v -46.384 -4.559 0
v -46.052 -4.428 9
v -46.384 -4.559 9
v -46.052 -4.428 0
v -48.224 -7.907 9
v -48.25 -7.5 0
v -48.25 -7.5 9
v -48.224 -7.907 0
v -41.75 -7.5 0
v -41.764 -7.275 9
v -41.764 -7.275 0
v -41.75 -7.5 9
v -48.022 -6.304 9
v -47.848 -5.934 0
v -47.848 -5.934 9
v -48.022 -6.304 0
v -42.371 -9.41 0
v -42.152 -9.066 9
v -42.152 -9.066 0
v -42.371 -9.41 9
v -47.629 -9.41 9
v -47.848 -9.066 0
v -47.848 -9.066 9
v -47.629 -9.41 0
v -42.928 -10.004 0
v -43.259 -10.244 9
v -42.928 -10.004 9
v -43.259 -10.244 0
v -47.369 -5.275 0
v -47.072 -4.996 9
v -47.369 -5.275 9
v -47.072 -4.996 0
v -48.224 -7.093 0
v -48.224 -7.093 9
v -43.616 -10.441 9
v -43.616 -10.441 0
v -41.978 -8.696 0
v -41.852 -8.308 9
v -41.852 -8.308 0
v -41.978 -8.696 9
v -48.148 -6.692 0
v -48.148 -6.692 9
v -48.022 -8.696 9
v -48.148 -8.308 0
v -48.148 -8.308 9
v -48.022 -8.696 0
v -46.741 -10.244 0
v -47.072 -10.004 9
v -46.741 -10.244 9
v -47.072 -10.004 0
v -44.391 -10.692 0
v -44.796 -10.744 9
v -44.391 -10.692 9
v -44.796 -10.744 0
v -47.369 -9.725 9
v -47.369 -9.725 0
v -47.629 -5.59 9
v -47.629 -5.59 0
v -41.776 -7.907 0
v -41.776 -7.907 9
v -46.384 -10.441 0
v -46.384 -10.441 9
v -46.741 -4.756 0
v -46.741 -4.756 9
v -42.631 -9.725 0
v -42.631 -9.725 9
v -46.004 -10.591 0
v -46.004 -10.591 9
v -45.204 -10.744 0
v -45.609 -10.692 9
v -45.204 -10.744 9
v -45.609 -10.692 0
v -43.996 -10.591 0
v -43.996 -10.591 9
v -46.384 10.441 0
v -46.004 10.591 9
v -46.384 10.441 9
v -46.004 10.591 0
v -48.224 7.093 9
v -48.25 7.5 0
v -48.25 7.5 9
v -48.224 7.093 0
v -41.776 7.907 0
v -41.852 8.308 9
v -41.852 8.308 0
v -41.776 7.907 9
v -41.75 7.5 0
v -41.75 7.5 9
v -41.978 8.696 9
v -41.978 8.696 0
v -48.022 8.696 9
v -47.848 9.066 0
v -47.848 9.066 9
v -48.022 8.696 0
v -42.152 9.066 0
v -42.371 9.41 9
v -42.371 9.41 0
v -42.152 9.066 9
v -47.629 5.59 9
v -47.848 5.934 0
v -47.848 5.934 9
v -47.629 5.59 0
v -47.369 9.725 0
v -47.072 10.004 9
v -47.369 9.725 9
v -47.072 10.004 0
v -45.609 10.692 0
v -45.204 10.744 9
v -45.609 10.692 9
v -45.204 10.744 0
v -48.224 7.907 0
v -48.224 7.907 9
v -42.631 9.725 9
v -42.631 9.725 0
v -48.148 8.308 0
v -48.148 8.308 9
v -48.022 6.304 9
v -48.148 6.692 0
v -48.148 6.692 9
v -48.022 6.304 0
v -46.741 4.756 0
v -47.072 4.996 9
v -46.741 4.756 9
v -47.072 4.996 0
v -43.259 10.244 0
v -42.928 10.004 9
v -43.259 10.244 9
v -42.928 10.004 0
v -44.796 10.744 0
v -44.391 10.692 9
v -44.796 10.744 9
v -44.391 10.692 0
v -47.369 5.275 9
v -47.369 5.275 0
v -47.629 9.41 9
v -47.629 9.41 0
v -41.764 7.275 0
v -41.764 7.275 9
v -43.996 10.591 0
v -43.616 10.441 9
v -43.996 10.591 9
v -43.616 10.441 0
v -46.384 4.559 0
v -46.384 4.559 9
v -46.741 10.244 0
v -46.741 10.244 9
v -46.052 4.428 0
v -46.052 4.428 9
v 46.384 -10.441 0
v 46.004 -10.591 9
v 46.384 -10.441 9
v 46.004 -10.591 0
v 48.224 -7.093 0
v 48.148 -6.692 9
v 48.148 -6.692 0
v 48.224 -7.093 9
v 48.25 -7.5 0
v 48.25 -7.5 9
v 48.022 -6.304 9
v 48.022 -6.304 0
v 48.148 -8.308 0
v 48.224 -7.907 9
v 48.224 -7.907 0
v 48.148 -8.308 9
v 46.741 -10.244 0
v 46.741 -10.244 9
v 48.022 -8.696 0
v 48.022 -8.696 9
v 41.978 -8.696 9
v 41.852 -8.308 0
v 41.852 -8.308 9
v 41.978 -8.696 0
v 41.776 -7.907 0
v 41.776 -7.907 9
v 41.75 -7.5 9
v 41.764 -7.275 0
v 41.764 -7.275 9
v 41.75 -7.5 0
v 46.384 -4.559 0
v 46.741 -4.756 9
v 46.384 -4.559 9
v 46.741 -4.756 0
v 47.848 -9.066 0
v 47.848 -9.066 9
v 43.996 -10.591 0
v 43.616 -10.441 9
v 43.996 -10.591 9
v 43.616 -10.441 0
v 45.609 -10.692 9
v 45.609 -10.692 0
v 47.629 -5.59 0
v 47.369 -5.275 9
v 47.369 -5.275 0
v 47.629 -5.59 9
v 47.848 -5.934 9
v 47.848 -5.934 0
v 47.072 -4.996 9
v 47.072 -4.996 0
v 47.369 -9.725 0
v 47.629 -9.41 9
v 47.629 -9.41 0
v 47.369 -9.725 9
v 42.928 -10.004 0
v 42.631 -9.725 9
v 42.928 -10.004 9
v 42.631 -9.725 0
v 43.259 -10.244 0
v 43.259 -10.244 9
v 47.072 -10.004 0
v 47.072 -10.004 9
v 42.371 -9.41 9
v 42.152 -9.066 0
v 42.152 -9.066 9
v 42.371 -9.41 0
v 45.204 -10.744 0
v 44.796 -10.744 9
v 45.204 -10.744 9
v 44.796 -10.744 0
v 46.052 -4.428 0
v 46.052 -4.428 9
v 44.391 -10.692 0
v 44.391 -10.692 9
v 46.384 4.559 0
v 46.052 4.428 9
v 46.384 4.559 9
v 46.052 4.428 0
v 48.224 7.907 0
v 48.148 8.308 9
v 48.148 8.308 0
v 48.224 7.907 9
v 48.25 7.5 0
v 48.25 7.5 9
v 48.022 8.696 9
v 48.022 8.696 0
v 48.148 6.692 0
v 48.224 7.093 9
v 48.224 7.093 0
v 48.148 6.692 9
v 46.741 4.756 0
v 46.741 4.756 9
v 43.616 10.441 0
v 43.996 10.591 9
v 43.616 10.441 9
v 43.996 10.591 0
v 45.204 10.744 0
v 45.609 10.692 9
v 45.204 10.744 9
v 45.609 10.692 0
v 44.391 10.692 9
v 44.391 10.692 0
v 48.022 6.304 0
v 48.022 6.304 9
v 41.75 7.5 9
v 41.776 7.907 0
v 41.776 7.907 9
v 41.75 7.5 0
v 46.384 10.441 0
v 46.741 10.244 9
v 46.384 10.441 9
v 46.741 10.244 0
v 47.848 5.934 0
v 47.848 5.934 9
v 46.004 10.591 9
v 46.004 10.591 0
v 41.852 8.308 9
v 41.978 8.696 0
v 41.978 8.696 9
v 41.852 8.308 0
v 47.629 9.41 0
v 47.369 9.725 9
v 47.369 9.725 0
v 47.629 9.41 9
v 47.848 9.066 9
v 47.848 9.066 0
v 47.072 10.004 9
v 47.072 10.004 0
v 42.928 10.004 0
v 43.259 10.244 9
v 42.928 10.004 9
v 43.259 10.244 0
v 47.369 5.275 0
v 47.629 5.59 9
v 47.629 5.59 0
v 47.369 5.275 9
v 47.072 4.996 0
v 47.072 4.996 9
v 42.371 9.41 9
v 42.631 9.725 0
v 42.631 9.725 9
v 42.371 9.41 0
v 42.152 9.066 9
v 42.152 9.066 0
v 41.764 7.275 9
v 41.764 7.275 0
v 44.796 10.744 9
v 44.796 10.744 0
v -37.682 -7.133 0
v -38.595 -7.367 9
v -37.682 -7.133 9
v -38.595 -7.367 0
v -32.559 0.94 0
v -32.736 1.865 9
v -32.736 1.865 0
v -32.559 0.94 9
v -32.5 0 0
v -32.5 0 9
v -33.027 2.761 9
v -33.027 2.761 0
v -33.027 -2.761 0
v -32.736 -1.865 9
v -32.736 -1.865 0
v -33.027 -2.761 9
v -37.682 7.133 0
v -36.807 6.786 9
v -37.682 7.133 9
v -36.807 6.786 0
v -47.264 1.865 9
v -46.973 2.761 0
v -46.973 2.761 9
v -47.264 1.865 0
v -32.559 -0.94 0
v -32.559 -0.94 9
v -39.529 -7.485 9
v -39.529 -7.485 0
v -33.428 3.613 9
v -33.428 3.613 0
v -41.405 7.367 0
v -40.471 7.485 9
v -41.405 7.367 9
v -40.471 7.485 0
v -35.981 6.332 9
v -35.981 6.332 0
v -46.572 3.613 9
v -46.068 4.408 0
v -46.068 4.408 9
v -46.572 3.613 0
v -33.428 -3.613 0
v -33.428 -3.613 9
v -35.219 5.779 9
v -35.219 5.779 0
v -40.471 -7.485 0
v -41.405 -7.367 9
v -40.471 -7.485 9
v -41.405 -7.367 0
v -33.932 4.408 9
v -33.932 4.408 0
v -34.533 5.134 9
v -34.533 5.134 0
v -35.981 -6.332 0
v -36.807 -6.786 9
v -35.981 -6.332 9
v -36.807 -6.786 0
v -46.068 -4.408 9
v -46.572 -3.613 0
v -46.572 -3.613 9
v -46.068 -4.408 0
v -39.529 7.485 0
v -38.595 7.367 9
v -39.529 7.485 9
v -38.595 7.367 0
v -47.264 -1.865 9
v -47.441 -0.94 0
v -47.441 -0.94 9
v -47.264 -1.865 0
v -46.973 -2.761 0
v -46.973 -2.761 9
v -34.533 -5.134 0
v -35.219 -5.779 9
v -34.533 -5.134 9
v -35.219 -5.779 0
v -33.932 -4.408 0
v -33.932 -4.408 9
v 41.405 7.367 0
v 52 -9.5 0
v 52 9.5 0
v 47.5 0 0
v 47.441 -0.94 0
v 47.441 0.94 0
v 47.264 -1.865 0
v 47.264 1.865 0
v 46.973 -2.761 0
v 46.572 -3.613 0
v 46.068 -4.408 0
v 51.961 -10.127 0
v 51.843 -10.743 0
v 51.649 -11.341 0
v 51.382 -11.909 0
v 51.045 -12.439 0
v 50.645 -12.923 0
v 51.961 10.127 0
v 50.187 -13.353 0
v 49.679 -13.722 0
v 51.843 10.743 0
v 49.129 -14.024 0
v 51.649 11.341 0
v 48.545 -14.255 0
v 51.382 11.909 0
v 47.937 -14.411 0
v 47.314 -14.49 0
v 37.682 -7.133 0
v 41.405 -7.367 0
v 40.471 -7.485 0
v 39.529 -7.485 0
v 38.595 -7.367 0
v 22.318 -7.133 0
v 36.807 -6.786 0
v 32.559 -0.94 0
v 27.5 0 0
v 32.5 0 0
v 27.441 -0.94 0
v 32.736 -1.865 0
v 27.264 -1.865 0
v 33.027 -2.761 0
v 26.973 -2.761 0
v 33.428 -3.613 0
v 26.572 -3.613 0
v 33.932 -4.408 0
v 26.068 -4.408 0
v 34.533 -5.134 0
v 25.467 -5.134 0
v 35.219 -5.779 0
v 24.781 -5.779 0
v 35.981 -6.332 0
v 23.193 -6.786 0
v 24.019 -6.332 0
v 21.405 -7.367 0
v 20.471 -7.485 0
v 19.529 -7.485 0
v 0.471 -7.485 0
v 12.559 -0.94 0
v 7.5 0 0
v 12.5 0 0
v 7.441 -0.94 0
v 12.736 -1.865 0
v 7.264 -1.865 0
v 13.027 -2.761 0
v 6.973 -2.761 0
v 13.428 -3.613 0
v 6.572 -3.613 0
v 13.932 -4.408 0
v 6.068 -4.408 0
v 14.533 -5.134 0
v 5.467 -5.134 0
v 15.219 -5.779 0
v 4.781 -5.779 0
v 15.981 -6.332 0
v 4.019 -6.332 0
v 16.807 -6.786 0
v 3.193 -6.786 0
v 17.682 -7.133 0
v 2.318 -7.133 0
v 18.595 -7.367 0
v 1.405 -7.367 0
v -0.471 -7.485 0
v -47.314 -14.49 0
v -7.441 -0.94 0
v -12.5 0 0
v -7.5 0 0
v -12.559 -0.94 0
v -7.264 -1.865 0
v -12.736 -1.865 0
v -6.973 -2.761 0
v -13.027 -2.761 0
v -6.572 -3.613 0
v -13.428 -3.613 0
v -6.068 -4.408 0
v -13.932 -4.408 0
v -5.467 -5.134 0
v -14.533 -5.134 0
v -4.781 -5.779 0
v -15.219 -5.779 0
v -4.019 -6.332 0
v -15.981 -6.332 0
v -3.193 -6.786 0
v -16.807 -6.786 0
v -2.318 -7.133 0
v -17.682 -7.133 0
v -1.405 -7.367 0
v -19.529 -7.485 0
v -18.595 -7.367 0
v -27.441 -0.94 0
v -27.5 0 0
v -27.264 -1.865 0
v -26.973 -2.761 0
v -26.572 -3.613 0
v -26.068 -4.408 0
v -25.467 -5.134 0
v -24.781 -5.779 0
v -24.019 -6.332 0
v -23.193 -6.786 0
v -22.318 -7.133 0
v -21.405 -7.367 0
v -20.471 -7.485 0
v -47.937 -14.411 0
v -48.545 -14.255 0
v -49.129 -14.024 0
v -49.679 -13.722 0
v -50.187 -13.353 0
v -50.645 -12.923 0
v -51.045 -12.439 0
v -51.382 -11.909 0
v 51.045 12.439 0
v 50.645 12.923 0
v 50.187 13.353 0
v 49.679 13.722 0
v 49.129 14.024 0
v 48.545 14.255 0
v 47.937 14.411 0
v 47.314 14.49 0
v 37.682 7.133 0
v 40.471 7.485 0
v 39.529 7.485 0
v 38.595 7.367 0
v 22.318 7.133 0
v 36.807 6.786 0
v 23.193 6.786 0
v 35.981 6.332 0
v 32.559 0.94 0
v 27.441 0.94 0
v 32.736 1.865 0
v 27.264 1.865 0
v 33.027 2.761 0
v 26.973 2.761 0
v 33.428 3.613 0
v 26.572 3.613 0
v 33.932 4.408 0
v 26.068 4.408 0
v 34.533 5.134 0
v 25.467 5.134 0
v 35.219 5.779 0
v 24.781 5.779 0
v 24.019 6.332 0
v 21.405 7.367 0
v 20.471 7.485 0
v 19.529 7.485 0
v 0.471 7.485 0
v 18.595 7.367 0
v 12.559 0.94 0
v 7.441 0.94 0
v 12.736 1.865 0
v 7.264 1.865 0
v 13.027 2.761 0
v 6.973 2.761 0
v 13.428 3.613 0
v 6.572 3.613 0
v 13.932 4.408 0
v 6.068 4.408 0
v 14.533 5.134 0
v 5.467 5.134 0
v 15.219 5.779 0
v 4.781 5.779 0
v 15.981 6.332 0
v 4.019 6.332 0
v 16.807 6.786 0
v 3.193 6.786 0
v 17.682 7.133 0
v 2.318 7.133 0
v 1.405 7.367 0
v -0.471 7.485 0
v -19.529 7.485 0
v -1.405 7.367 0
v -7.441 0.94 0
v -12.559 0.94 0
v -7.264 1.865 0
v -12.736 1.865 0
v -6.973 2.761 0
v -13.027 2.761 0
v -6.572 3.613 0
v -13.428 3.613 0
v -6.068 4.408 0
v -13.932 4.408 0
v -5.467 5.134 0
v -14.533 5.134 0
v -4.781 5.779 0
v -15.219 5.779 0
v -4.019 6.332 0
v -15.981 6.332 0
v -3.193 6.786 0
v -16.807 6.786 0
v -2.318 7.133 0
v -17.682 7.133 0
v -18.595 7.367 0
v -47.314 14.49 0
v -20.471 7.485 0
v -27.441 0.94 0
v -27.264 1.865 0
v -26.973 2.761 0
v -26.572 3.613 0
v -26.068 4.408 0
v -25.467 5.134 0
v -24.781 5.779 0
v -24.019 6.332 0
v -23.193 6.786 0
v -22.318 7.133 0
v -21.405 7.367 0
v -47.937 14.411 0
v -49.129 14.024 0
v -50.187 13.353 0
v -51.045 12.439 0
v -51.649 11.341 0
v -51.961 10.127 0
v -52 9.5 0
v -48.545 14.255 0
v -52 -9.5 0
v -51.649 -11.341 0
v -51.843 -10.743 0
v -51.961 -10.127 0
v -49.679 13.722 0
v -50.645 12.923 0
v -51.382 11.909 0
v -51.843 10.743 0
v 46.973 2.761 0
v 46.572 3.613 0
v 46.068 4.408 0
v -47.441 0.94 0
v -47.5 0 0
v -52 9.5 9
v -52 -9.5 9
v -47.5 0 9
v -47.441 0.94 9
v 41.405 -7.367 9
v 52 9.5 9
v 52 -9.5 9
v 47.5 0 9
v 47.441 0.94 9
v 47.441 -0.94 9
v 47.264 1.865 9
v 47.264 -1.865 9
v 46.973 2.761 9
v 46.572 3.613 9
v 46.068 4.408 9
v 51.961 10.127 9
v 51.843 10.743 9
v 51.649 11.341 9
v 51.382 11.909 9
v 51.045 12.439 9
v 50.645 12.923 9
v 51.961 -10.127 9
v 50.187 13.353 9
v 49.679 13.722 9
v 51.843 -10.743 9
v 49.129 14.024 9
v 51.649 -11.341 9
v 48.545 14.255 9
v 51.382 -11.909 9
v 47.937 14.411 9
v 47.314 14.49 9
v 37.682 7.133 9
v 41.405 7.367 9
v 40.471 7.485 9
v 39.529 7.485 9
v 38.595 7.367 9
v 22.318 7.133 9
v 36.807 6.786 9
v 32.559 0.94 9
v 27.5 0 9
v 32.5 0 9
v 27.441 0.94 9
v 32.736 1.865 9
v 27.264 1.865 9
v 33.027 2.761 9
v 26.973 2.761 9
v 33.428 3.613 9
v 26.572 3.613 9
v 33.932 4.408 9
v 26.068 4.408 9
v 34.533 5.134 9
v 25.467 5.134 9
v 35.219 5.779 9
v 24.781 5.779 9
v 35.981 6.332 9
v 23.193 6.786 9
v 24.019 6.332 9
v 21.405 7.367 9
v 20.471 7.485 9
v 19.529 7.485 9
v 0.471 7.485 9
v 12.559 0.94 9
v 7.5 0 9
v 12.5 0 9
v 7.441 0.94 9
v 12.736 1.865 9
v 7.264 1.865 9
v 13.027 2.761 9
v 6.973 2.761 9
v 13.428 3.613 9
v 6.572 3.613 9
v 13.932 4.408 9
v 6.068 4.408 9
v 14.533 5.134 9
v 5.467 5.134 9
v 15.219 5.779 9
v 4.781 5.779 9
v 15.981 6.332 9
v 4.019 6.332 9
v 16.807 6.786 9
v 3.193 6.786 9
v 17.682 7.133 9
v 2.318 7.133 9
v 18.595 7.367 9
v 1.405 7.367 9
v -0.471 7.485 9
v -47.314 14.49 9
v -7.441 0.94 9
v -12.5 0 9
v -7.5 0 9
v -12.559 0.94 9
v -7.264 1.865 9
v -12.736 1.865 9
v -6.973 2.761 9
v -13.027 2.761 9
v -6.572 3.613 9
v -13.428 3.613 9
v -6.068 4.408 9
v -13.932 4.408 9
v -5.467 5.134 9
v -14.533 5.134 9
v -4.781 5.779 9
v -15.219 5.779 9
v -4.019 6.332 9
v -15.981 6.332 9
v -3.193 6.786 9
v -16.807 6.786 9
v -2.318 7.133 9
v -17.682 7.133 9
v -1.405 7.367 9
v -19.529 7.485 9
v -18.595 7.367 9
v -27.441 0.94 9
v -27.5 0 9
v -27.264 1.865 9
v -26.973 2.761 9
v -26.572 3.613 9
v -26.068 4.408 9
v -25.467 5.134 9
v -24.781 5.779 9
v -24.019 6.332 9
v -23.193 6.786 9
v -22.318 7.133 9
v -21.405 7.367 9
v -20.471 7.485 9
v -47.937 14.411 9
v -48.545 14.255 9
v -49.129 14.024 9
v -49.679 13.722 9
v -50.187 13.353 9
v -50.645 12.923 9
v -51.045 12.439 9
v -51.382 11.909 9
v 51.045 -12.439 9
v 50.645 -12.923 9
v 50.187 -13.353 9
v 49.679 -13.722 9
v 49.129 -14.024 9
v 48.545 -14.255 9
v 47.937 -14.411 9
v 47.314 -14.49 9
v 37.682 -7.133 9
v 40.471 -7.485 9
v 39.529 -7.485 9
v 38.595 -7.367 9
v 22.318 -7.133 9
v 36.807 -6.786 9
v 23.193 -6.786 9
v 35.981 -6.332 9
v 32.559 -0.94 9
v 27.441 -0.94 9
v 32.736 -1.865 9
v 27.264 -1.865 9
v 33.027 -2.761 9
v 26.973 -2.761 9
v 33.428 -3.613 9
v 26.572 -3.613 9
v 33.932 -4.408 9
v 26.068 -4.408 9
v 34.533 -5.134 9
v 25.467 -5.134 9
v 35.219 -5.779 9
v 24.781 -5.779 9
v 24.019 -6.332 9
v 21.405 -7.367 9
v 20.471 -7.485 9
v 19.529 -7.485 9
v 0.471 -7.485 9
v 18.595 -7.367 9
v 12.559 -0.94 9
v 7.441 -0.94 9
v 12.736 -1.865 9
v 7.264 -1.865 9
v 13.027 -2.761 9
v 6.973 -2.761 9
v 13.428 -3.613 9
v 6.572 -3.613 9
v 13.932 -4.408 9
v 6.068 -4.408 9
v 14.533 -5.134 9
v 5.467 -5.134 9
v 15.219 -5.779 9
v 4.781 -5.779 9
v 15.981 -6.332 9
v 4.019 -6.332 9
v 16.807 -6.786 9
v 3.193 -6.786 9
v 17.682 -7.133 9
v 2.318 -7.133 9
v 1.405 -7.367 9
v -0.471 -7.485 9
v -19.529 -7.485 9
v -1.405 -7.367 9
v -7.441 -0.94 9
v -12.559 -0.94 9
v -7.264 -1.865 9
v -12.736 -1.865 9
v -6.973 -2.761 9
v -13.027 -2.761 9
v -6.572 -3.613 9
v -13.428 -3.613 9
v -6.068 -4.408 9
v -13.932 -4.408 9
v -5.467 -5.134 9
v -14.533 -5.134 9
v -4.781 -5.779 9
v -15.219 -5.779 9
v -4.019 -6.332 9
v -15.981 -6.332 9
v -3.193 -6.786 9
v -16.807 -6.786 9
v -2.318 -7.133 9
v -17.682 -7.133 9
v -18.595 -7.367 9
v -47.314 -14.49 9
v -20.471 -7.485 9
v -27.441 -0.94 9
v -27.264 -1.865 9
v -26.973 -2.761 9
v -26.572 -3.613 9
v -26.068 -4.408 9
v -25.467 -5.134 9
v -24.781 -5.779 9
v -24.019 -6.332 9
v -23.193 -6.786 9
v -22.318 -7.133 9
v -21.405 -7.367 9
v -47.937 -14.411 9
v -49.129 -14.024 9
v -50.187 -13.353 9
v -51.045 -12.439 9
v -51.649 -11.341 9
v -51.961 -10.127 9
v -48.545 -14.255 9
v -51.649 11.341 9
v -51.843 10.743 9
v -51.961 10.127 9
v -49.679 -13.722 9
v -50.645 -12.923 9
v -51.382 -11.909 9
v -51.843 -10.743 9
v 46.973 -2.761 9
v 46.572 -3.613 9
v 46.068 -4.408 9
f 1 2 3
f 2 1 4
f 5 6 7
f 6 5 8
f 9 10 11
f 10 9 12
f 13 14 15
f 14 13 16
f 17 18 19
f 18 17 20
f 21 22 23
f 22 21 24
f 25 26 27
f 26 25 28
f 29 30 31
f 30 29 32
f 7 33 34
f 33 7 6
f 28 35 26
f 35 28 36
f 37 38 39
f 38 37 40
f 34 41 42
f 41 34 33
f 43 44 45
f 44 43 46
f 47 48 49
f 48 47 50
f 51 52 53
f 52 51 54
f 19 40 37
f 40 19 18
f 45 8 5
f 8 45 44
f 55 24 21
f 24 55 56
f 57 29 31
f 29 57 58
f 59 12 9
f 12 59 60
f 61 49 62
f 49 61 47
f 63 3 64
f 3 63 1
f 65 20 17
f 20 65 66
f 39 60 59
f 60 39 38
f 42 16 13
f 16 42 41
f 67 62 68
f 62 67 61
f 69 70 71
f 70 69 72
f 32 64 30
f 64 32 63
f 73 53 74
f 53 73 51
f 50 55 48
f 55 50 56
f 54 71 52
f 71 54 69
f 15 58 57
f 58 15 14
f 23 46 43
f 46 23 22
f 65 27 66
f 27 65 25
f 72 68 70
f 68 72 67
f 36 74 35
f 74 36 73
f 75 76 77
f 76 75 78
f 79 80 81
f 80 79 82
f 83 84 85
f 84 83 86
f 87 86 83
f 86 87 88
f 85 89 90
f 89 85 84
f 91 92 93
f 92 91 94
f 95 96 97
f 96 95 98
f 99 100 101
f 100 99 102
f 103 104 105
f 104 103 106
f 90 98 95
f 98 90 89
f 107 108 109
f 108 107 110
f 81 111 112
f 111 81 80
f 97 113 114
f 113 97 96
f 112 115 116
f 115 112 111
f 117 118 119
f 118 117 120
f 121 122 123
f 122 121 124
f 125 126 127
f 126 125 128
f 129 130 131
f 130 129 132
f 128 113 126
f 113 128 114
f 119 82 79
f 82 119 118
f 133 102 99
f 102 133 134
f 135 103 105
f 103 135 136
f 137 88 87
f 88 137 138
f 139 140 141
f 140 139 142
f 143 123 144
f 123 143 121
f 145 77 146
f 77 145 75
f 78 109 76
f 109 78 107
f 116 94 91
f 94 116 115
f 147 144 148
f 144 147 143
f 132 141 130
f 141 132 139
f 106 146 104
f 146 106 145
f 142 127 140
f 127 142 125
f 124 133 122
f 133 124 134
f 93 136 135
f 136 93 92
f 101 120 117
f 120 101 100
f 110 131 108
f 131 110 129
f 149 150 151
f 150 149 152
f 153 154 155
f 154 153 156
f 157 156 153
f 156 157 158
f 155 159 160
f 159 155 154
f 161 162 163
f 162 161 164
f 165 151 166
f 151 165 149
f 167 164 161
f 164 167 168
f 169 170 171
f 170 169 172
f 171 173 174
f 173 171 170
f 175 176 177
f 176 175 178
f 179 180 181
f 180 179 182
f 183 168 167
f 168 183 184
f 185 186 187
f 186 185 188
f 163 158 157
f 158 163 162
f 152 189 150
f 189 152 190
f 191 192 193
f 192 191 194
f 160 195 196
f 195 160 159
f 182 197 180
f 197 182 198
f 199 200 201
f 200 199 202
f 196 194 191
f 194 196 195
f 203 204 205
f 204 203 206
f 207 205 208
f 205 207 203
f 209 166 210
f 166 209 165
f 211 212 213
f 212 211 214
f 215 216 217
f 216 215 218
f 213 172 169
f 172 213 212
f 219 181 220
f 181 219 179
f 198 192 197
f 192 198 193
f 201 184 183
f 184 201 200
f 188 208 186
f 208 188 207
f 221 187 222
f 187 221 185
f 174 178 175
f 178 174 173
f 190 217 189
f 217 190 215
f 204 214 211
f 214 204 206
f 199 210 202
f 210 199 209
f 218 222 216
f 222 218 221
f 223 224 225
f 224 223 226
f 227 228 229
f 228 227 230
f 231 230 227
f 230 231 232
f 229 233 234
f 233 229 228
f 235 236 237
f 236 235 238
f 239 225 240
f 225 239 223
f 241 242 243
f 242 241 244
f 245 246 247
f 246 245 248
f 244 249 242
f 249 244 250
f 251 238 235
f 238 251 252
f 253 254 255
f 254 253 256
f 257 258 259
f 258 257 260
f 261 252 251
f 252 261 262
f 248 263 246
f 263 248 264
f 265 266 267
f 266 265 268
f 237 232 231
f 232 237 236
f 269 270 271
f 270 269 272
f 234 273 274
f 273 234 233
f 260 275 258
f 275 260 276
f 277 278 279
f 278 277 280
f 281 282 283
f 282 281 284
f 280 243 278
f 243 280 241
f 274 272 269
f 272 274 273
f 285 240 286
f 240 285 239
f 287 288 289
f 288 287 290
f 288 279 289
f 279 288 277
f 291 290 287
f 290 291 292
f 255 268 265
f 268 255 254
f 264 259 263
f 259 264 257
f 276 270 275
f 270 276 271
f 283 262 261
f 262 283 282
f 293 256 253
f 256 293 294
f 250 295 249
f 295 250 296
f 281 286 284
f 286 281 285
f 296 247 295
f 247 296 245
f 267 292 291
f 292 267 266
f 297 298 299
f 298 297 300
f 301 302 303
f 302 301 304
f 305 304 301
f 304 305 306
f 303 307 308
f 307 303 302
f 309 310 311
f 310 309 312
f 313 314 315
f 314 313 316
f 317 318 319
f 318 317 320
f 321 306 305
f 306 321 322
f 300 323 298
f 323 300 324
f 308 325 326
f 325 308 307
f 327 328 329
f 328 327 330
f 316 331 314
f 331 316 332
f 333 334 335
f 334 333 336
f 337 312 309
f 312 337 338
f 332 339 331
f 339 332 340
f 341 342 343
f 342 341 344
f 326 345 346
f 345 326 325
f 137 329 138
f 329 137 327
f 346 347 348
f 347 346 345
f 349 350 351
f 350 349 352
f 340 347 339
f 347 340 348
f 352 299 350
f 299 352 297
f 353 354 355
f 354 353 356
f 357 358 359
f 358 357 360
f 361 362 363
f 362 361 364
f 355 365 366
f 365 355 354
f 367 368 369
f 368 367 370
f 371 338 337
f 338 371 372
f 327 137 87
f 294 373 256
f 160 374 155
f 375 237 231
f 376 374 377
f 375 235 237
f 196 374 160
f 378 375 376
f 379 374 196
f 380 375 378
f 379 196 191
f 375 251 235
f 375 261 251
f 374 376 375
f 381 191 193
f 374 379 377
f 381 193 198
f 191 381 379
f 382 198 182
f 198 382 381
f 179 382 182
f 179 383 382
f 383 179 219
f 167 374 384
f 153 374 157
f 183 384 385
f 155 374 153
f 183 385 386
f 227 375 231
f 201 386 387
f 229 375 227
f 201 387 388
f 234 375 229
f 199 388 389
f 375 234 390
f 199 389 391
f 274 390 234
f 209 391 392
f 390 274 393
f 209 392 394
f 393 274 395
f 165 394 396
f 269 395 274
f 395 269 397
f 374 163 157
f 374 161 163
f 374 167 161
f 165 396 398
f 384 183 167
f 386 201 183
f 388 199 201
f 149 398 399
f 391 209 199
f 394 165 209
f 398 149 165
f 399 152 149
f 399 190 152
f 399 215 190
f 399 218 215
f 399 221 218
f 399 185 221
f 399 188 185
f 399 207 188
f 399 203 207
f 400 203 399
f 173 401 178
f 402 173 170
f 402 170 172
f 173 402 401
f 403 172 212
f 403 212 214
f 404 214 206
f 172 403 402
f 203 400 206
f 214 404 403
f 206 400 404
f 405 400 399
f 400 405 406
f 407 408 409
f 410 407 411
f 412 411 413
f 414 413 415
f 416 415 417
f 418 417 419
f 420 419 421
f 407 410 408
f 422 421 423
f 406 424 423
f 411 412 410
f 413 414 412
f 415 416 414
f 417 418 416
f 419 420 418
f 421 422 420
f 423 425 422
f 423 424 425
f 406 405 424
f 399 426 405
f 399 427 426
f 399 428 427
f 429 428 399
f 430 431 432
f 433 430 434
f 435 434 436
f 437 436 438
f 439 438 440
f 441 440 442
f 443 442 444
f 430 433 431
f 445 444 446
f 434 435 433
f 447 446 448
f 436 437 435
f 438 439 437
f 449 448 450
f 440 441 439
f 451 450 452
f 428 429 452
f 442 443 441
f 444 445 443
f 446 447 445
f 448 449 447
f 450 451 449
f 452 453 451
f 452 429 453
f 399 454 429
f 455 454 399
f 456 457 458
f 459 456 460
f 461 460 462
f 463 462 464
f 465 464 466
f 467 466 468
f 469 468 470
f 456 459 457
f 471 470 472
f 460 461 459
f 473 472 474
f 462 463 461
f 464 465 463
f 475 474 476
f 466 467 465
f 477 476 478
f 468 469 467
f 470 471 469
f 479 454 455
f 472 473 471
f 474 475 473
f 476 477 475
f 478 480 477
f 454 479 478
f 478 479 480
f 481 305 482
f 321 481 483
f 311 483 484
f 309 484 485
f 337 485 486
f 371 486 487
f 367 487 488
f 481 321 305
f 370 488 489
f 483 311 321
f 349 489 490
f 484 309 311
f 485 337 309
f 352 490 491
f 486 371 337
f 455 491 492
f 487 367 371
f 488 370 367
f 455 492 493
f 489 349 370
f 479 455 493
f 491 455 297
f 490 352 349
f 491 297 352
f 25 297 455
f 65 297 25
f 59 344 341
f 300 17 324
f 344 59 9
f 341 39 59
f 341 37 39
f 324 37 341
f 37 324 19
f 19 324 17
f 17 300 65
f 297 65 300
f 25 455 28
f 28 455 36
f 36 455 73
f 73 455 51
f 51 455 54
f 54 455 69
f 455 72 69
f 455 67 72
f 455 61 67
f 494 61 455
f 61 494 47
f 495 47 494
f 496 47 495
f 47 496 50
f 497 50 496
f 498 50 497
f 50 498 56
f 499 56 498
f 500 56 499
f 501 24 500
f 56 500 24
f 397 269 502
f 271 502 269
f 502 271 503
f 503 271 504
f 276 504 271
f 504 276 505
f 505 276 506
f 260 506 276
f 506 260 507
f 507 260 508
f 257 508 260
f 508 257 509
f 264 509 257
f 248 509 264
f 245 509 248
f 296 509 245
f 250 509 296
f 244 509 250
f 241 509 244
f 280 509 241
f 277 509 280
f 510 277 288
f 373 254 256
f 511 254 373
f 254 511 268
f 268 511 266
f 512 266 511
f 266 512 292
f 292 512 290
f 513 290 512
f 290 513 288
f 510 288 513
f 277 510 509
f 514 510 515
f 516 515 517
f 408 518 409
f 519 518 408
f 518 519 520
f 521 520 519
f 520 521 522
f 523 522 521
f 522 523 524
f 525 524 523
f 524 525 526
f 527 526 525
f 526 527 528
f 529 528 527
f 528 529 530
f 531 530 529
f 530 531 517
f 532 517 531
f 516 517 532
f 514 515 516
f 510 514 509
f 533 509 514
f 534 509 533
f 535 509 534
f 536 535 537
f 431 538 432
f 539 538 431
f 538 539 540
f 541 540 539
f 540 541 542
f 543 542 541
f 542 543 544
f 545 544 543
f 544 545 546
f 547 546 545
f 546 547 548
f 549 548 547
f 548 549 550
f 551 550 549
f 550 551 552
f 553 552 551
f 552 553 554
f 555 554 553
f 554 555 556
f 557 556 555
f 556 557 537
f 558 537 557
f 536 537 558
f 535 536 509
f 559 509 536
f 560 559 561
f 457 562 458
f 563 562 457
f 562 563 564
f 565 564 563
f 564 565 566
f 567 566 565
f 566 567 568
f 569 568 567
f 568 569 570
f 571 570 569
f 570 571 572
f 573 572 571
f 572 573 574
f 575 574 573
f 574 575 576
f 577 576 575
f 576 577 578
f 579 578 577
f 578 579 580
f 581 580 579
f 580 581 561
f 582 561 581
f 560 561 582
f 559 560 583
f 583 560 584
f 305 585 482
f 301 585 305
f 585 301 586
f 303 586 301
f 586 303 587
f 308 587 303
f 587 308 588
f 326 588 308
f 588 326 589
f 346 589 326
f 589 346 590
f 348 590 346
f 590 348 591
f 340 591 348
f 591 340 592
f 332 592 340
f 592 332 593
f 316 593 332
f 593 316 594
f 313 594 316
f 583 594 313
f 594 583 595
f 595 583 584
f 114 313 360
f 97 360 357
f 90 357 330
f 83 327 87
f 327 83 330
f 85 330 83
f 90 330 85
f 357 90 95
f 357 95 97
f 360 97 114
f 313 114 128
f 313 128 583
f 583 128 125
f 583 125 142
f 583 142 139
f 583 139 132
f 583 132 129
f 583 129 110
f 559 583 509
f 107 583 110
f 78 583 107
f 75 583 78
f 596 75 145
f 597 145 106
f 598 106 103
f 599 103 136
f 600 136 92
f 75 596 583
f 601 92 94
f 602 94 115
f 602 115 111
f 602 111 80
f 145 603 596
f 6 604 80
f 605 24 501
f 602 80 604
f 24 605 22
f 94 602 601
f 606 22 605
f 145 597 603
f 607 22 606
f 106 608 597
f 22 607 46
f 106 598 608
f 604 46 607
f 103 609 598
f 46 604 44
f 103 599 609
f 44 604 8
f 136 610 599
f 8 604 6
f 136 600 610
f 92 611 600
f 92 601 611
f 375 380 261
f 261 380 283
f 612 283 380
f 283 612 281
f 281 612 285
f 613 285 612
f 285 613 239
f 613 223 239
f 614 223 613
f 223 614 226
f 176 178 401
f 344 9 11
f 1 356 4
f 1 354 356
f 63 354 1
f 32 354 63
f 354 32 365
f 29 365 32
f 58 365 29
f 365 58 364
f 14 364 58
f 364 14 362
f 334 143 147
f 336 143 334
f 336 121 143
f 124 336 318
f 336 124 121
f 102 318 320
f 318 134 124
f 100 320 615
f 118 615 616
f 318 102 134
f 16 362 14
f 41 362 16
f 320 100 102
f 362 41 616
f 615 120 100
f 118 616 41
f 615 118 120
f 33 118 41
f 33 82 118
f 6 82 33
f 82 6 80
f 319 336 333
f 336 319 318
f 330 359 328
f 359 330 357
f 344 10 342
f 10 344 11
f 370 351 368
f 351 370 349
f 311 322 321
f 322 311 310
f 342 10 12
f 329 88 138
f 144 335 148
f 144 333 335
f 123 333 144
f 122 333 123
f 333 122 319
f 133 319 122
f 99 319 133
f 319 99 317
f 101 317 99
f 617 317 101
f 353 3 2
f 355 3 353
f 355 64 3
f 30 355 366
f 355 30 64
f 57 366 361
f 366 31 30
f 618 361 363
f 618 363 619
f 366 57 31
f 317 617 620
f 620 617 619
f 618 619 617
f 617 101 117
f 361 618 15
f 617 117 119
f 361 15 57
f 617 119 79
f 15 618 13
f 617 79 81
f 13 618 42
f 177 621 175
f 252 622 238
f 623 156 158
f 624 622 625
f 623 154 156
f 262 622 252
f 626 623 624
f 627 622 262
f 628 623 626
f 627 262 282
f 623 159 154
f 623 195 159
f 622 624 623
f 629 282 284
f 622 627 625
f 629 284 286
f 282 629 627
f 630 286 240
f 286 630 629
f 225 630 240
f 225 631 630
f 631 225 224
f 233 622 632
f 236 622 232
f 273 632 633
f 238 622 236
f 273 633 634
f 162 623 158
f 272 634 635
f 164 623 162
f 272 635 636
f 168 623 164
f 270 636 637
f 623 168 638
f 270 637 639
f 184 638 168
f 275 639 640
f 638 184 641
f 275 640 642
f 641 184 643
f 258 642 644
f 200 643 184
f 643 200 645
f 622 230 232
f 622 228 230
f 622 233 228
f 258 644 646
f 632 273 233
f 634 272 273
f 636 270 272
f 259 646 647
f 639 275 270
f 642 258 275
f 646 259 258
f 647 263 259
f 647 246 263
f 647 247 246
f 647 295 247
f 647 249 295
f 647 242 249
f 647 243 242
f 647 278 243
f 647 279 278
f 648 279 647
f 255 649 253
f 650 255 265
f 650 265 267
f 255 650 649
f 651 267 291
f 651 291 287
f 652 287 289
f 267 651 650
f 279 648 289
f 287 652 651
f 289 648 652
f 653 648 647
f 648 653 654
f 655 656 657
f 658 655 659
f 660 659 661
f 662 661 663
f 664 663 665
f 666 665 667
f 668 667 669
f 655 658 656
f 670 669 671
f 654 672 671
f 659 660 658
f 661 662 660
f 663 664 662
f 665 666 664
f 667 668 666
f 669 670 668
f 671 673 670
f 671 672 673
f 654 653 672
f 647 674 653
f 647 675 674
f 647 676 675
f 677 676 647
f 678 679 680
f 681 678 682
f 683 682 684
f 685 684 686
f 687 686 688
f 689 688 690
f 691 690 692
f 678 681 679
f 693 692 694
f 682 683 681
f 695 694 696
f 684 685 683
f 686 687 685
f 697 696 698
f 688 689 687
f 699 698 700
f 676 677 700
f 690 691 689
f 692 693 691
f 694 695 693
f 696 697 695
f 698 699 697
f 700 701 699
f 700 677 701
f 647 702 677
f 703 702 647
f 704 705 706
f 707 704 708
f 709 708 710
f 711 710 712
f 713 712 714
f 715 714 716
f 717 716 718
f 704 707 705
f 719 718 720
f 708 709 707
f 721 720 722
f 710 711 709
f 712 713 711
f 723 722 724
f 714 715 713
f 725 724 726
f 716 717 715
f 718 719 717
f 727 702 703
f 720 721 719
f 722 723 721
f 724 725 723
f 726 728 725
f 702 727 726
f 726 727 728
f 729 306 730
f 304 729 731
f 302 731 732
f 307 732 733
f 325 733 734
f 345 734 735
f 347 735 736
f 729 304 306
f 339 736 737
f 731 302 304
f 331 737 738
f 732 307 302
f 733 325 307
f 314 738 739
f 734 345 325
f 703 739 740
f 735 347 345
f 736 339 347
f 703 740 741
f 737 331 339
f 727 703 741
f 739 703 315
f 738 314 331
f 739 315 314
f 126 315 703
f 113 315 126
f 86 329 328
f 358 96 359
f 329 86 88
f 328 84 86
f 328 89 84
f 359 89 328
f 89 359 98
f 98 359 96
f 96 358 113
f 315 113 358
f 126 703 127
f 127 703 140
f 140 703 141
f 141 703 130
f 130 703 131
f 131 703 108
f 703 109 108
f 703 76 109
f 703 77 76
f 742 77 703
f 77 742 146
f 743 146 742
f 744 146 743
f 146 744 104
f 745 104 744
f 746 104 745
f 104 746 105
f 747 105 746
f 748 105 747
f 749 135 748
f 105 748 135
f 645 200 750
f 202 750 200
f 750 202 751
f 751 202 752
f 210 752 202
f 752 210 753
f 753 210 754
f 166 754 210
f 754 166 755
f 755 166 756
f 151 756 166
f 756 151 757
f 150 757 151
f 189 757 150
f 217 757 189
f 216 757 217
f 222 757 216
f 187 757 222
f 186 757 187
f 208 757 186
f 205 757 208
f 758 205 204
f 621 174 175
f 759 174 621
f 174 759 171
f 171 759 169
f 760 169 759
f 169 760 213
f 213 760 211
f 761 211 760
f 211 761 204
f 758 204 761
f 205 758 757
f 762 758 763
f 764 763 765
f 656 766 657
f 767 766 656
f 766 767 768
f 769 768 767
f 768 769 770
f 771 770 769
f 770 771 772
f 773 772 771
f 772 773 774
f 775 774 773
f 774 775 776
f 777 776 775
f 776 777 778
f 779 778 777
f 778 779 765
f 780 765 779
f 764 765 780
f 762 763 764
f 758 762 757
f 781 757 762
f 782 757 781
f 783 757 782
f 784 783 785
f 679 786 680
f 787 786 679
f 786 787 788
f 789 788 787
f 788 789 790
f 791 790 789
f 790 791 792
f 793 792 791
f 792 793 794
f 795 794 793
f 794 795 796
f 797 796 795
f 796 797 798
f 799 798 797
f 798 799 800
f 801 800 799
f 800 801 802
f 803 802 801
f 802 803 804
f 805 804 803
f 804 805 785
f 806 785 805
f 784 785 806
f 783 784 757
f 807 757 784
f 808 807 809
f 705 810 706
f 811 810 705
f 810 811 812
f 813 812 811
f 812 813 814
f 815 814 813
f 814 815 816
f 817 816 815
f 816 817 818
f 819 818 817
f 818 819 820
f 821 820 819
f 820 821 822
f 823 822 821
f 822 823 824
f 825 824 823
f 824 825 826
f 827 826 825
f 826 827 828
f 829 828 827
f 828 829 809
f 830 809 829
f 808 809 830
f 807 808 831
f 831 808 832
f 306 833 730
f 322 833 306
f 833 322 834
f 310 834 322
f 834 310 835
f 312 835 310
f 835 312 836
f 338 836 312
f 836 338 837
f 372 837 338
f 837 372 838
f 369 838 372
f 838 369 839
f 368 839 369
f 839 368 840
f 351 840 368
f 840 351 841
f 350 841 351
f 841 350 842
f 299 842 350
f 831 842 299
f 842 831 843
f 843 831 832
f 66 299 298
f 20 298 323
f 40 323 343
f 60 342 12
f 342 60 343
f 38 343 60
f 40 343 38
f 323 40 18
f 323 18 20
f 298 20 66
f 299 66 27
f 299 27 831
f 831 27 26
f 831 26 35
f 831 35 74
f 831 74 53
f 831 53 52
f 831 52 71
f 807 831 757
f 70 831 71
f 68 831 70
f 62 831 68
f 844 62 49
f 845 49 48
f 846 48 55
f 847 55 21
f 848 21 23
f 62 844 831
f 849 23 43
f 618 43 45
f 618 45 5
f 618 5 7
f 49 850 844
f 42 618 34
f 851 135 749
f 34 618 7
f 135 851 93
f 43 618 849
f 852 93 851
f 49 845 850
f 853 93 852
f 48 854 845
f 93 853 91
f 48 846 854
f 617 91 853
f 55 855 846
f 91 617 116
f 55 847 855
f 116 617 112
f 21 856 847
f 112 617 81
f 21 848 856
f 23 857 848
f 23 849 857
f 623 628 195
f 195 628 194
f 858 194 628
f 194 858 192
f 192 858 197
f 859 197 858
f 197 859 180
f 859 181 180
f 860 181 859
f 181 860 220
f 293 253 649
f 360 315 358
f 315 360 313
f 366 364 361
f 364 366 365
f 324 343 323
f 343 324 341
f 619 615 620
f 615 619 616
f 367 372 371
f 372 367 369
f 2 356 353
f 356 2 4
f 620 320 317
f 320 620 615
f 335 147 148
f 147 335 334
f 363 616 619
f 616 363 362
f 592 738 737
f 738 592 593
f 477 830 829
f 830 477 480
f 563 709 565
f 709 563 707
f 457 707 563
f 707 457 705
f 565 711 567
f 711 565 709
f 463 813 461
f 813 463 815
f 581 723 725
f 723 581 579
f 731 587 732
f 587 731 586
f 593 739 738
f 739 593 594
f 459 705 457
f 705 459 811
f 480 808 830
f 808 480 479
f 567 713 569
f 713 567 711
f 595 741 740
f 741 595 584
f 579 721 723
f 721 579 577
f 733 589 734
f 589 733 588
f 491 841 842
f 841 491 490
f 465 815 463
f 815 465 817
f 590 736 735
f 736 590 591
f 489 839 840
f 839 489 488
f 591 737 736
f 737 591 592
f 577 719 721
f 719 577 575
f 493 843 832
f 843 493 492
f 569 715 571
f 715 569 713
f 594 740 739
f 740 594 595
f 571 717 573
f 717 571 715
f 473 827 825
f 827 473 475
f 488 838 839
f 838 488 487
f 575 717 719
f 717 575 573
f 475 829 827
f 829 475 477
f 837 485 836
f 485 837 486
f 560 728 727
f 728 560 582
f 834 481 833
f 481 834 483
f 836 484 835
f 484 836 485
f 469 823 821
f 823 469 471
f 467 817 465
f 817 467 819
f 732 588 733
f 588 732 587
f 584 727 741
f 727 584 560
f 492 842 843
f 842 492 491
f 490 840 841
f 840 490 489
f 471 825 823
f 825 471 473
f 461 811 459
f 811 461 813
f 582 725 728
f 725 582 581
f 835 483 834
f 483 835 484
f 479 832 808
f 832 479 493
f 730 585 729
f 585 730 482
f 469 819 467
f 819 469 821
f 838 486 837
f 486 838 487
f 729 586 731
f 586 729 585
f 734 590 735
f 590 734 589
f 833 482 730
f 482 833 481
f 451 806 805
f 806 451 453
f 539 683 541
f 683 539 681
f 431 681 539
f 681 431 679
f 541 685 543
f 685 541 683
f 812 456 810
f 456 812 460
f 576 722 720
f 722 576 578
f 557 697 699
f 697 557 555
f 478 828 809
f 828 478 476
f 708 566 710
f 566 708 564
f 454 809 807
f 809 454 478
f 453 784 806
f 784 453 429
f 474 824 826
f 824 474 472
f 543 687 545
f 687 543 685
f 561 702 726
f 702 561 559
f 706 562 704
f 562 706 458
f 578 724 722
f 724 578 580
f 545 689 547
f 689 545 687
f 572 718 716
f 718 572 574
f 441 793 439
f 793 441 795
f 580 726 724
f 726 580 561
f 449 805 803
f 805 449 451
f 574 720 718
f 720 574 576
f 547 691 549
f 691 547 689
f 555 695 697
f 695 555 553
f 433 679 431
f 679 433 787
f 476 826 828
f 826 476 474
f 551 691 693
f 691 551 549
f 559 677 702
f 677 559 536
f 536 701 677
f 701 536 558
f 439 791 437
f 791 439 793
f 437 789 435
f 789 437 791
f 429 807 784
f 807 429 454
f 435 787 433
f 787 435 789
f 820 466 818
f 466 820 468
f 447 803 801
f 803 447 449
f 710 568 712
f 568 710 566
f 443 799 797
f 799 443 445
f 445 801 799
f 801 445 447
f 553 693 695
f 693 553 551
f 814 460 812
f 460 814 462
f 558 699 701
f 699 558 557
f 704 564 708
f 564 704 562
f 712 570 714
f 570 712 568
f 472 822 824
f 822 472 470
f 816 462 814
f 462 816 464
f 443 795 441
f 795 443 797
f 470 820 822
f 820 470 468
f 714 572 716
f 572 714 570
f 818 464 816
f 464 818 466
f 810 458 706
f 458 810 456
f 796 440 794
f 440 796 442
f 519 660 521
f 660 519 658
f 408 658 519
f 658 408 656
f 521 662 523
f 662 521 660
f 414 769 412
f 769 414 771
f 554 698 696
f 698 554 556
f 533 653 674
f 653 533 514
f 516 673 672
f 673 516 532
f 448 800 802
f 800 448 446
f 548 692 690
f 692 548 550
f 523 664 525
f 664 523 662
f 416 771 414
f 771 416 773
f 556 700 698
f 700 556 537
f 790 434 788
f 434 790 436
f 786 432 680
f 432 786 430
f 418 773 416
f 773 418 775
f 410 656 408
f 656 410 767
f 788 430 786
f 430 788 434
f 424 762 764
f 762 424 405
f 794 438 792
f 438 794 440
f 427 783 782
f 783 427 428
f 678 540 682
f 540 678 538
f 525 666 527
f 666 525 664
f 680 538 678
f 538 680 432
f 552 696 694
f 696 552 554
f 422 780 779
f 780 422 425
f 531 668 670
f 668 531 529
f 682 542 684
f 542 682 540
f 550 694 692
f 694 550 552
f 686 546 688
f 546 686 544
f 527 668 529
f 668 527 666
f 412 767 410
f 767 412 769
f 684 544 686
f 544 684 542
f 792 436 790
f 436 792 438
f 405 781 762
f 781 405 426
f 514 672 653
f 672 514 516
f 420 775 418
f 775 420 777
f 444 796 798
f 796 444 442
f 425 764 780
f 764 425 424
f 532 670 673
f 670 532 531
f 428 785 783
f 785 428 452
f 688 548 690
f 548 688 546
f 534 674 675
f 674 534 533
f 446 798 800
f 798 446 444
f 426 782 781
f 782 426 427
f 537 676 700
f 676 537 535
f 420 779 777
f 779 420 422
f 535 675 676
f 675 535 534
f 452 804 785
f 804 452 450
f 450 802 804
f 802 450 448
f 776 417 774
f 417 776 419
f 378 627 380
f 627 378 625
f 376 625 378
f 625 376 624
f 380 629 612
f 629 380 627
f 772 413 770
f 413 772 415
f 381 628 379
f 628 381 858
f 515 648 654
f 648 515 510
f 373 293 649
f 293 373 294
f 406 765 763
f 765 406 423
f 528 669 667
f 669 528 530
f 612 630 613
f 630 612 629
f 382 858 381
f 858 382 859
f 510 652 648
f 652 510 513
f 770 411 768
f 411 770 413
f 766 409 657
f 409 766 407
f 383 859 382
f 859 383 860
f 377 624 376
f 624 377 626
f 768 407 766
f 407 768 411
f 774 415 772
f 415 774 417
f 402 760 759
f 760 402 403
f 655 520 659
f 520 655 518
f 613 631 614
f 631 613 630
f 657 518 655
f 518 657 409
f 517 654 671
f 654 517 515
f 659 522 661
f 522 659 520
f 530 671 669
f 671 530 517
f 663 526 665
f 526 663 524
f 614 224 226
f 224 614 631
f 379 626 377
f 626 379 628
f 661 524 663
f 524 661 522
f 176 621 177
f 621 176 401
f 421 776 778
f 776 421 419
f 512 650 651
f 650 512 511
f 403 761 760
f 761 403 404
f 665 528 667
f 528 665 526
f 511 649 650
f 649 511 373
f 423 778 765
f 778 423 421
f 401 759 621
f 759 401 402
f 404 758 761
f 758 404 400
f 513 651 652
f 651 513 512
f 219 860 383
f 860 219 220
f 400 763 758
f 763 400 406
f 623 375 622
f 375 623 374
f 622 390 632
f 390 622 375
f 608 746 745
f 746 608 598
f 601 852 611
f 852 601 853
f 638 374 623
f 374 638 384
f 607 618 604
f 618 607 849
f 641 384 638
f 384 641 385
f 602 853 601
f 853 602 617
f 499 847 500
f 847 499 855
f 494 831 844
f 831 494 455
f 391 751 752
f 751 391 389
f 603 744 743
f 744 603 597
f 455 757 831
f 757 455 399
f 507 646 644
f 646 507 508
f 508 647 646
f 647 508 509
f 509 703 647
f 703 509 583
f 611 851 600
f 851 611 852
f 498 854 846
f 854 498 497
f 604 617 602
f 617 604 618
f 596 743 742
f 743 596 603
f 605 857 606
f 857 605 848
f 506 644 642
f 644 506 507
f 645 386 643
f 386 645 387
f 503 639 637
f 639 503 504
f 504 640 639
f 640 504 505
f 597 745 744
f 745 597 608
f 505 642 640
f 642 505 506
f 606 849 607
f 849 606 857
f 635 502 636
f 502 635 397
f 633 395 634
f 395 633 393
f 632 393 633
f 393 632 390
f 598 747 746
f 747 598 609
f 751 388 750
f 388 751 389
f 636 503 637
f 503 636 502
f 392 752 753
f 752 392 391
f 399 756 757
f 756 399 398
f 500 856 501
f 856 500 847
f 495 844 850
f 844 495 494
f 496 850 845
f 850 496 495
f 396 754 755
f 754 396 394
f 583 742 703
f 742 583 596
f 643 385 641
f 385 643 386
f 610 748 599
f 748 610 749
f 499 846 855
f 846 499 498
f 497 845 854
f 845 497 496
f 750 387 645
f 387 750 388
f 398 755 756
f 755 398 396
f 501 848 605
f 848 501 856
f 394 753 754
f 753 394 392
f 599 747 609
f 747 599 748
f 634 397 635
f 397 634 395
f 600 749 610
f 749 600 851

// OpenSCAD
$fn = 50;

difference() {
	union() {
		hull() {
			translate(v = [-47.0, 9.5, 0]) {
				cylinder(h = 9, r = 5);
			}
			translate(v = [47.0, 9.5, 0]) {
				cylinder(h = 9, r = 5);
			}
			translate(v = [-47.0, -9.5, 0]) {
				cylinder(h = 9, r = 5);
			}
			translate(v = [47.0, -9.5, 0]) {
				cylinder(h = 9, r = 5);
			}
		}
	}
	union() {
		translate(v = [-45.0, -7.5, -100.0]) {
			cylinder(h = 200, r = 3.25);
		}
		translate(v = [-45.0, 7.5, -100.0]) {
			cylinder(h = 200, r = 3.25);
		}
		translate(v = [45.0, -7.5, -100.0]) {
			cylinder(h = 200, r = 3.25);
		}
		translate(v = [45.0, 7.5, -100.0]) {
			cylinder(h = 200, r = 3.25);
		}
		translate(v = [-45.0, -7.5, -100.0]) {
			cylinder(h = 200, r = 1.8);
		}
		translate(v = [-45.0, 7.5, -100.0]) {
			cylinder(h = 200, r = 1.8);
		}
		translate(v = [45.0, -7.5, -100.0]) {
			cylinder(h = 200, r = 1.8);
		}
		translate(v = [45.0, 7.5, -100.0]) {
			cylinder(h = 200, r = 1.8);
		}
		translate(v = [-40.0, 0, 0.0]) {
			cylinder(h = 9, r = 7.5);
		}
		translate(v = [-20.0, 0, 0.0]) {
			cylinder(h = 9, r = 7.5);
		}
		cylinder(h = 9, r = 7.5);
		translate(v = [20.0, 0, 0.0]) {
			cylinder(h = 9, r = 7.5);
		}
		translate(v = [40.0, 0, 0.0]) {
			cylinder(h = 9, r = 7.5);
		}
	}
}
